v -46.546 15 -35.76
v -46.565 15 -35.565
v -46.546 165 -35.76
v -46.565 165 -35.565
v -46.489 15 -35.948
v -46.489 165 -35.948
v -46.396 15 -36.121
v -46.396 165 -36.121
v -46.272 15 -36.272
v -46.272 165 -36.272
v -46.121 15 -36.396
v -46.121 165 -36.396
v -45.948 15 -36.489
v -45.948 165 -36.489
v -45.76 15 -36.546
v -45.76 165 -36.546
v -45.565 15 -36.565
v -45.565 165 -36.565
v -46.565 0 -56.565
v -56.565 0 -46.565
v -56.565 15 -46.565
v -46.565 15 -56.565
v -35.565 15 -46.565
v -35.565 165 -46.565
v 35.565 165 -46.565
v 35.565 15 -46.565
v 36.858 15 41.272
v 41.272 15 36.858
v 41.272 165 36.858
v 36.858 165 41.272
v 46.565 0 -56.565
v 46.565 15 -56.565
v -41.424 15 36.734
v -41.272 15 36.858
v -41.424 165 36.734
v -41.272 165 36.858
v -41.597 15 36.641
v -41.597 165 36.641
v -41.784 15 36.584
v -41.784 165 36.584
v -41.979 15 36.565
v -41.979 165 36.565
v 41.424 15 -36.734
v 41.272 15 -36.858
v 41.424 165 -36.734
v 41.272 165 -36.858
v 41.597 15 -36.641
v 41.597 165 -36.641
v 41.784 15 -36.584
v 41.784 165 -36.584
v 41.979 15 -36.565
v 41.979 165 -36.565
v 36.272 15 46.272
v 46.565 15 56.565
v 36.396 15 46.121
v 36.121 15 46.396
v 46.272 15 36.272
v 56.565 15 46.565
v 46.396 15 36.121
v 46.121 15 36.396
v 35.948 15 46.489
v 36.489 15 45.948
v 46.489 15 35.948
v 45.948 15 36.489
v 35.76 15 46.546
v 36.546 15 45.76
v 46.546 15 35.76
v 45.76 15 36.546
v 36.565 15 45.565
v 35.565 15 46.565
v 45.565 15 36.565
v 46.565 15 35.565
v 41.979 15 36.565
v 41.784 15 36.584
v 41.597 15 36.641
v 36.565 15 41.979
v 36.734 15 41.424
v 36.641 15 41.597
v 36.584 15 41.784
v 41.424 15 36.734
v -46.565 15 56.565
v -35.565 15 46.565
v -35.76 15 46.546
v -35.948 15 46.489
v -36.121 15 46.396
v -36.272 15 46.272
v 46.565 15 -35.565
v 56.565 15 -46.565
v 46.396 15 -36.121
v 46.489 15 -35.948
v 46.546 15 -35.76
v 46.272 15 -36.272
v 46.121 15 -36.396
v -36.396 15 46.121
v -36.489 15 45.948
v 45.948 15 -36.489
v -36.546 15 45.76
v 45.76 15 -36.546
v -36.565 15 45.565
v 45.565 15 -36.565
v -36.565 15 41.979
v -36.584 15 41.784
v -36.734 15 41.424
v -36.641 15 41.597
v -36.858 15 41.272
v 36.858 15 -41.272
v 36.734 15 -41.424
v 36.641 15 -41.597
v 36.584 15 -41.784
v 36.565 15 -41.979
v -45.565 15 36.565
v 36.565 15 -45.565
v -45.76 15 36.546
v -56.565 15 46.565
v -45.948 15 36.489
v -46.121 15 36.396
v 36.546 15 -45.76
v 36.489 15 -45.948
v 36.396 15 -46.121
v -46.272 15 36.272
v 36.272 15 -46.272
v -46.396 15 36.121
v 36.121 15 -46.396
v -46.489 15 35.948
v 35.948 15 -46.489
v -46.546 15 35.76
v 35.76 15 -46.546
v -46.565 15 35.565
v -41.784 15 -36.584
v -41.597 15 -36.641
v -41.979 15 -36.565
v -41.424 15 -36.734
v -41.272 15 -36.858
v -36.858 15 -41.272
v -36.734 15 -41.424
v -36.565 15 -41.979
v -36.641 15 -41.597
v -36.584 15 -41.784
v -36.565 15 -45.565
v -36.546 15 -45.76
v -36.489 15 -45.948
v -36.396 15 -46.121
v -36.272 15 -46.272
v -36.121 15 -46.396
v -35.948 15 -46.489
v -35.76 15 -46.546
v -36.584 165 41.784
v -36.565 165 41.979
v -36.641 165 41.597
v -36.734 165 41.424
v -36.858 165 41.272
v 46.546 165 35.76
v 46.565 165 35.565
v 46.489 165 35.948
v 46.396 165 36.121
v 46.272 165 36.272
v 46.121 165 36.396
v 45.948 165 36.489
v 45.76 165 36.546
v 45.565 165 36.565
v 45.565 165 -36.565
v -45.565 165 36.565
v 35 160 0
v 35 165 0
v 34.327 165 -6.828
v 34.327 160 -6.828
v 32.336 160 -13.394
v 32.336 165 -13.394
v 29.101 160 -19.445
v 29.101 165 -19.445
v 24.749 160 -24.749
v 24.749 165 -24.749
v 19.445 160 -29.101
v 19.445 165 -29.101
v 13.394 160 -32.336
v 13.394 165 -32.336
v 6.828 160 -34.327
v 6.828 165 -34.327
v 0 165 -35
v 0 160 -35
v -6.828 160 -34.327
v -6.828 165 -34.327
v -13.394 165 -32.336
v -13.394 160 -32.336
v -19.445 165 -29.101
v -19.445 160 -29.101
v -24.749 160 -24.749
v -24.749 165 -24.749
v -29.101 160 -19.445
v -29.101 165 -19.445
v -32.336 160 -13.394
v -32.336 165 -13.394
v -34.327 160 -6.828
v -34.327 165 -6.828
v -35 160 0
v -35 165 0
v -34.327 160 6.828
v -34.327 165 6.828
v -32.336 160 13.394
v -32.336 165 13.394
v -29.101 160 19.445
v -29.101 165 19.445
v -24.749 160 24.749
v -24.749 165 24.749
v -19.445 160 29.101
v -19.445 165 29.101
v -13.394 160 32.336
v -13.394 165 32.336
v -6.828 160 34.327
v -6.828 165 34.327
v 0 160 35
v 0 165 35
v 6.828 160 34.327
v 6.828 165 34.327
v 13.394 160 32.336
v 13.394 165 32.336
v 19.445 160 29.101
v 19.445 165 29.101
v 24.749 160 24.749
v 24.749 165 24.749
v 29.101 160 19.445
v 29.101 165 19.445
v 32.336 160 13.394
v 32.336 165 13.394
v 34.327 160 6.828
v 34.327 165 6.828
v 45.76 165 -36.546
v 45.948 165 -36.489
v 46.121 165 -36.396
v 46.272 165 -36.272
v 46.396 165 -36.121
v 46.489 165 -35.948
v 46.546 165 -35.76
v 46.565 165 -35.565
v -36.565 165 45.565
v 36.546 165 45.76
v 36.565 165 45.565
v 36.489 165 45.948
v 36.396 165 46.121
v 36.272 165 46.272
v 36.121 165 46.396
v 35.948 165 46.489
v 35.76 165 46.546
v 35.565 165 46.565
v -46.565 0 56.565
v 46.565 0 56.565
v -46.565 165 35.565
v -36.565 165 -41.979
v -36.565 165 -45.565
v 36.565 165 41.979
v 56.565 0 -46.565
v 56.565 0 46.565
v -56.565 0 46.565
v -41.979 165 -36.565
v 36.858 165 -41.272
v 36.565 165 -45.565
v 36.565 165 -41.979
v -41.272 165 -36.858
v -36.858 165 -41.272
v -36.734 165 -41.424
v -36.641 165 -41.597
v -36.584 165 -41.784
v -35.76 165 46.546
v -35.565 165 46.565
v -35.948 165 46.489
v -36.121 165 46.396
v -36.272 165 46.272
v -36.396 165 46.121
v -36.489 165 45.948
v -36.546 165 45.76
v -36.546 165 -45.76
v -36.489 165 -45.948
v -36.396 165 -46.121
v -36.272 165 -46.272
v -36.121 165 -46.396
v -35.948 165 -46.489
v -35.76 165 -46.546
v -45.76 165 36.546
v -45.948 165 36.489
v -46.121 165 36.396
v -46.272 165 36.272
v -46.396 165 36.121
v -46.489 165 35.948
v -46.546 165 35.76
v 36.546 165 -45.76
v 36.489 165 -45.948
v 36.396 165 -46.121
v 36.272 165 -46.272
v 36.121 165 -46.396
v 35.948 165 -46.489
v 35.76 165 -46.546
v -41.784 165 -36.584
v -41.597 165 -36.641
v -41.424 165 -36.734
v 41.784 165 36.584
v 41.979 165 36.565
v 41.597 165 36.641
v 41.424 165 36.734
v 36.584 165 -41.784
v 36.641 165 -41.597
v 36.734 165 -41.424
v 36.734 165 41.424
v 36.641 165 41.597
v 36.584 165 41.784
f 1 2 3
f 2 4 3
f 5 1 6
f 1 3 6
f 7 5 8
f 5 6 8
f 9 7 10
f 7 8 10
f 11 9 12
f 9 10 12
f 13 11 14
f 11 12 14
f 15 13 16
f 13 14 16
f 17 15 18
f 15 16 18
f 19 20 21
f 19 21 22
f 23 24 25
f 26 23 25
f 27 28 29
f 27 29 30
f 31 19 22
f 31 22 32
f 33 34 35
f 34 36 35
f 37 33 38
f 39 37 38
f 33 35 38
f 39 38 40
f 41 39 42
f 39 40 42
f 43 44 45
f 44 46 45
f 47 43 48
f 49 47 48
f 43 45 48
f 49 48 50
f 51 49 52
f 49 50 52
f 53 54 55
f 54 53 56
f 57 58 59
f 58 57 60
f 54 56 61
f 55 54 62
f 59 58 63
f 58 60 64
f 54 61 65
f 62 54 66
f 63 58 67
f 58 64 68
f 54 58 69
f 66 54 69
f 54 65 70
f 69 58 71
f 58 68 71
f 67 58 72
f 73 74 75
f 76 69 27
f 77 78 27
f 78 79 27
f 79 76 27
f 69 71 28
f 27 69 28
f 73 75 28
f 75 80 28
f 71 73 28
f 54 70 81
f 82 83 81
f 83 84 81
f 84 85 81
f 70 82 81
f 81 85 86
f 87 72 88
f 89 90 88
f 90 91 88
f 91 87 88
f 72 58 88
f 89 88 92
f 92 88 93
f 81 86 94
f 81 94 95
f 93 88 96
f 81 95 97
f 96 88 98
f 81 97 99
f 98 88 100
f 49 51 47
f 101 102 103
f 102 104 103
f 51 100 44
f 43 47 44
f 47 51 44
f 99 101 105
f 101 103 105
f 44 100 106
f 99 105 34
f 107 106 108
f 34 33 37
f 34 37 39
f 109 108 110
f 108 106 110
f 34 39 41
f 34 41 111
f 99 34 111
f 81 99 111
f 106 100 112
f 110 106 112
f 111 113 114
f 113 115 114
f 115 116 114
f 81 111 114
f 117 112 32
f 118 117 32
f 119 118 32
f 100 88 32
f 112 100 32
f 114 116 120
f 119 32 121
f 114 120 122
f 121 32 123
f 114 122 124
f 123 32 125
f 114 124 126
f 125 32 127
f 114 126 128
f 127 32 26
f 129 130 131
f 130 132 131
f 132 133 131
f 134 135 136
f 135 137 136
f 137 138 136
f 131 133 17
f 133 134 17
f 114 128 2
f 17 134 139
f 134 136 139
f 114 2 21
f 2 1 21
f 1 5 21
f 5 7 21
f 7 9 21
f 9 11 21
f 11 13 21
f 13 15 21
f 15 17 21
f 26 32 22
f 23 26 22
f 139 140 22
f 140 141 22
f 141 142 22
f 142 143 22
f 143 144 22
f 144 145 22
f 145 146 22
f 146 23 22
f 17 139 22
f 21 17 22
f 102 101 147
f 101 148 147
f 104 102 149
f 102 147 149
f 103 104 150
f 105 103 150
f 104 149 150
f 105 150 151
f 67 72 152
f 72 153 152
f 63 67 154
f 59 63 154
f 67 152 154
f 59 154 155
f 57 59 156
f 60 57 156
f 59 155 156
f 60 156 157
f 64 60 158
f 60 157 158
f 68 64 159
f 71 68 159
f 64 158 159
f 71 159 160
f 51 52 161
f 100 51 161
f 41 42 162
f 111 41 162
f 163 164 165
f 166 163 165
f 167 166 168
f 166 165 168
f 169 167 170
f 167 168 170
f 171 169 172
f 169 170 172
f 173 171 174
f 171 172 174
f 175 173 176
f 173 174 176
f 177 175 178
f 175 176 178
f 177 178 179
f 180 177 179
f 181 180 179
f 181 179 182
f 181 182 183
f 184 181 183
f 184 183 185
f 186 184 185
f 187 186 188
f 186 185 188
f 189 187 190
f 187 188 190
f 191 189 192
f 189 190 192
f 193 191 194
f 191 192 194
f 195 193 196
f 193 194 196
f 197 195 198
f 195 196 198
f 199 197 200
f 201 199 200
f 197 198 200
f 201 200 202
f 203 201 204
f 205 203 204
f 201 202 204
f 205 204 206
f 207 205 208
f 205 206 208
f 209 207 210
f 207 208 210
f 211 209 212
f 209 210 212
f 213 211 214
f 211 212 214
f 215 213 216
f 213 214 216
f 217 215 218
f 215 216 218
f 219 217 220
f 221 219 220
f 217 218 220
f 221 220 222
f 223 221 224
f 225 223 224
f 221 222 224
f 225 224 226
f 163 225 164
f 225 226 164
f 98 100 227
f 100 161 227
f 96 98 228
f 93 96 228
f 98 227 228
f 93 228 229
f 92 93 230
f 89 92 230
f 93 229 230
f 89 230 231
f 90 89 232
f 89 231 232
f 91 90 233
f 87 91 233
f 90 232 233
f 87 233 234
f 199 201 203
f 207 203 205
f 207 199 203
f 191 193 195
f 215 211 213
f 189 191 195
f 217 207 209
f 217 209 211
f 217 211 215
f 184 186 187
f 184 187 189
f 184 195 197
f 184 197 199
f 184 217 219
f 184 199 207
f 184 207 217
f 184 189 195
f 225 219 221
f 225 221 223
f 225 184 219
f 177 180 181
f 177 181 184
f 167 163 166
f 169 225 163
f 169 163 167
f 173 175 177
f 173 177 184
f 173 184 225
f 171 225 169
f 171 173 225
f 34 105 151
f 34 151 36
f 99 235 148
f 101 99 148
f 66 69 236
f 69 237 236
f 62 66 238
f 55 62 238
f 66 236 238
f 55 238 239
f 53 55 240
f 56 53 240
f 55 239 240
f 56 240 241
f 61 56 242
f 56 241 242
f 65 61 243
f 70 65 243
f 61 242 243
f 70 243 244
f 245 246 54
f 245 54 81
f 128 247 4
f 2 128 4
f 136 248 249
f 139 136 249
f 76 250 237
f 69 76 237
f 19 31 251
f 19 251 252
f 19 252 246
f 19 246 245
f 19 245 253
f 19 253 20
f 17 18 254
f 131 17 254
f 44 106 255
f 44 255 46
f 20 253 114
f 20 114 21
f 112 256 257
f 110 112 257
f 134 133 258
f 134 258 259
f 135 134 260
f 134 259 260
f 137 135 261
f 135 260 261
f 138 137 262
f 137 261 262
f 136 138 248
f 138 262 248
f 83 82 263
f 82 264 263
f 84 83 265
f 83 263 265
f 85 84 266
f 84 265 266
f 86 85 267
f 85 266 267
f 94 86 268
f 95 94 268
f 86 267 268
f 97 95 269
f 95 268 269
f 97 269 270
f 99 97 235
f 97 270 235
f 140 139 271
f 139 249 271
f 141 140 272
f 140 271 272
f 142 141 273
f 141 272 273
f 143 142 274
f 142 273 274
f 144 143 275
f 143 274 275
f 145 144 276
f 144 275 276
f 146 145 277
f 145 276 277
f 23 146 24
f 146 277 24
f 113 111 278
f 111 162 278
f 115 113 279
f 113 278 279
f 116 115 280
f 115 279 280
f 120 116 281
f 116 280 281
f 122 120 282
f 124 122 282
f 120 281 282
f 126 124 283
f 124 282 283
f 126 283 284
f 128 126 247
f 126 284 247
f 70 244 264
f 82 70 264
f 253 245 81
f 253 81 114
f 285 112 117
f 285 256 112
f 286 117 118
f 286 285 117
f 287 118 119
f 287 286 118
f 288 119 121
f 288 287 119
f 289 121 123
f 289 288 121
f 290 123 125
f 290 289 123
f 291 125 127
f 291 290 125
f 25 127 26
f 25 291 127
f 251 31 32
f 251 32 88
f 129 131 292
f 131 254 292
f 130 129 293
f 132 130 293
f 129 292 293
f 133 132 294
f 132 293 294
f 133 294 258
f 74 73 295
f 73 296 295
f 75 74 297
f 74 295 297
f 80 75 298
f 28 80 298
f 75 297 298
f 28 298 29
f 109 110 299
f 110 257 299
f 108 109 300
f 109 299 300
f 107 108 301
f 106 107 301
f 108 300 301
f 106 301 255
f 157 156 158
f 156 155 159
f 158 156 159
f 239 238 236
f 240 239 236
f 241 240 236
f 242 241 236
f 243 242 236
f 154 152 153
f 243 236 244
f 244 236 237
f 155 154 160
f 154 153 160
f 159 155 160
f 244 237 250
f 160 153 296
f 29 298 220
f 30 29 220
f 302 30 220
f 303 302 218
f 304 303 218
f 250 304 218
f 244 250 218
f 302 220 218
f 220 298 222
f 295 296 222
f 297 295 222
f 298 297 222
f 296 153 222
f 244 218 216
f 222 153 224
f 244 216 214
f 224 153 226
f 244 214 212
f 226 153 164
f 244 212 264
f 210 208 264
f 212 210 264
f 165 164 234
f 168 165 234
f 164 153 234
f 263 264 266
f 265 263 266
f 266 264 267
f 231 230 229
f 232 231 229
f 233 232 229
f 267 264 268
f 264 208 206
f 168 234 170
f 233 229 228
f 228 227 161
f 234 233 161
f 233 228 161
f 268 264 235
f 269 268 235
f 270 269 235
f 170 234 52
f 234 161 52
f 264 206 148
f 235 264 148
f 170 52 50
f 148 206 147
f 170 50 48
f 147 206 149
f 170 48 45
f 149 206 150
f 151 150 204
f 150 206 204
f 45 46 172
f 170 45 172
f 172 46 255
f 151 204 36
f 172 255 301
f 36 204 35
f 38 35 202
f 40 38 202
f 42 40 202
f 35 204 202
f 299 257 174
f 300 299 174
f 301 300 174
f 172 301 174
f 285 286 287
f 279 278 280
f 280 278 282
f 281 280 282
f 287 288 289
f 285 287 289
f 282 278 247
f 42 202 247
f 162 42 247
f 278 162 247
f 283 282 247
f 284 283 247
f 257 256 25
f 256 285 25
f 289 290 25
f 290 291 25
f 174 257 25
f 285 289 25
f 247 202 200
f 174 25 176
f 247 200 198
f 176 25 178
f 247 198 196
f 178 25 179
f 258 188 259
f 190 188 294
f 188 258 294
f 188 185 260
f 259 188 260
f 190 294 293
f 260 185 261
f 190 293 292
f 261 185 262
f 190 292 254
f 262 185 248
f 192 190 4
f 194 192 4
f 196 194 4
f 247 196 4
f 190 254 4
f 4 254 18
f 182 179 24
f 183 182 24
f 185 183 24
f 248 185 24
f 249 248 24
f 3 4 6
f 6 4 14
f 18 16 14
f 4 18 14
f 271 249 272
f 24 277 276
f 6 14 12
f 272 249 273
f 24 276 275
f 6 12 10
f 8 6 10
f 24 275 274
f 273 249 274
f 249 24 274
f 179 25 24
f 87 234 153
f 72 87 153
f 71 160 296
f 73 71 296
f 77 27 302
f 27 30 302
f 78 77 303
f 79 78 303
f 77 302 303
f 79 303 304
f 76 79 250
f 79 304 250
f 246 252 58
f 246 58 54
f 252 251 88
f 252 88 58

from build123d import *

# Parameters (mm, degrees)
BOSS_EXTRUDE1_DEPTH = 15
BOSS_EXTRUDE2_DEPTH = 150
FILLET1_R           = 1
SKETCH3_R           = 35
CUT_EXTRUDE1_DEPTH  = 5


with BuildPart() as part:
    # Sketch1 → Boss-Extrude1 (new body)
    with BuildSketch(Plane(origin=(0, 0, 0), x_dir=(1, 0, 0), z_dir=(0, 1, 0))):
        Polygon((-56.565, 46.565), (-46.565, 56.565), (46.565, 56.565), (56.565, 46.565), (56.565, -46.565), (46.565, -56.565), (-46.565, -56.565), (-56.565, -46.565), align=None)
    extrude(amount=BOSS_EXTRUDE1_DEPTH)

    # Sketch2 → Boss-Extrude2 (add)
    with BuildSketch(Plane(origin=(0, 15, 0), x_dir=(1, 0, 0), z_dir=(0, 1, 0))):
        Polygon((36.565, 46.565), (36.565, 41.565), (41.565, 36.565), (46.565, 36.565), (46.565, -36.565), (41.565, -36.565), (36.565, -41.565), (36.565, -46.565), (-36.565, -46.565), (-36.565, -41.565), (-41.565, -36.565), (-46.565, -36.565), (-46.565, 36.565), (-41.565, 36.565), (-36.565, 41.565), (-36.565, 46.565), align=None)
    extrude(amount=BOSS_EXTRUDE2_DEPTH)

    # Fillet1
    fillet1_edges = [part.edges().sort_by_distance(p)[0] for p in [
        (36.565, 90, -46.565),
        (-36.565, 90, -46.565),
        (-36.565, 90, -41.565),
        (-41.565, 90, -36.565),
        (-46.565, 90, -36.565),
        (-46.565, 90, 36.565),
        (-41.565, 90, 36.565),
        (-36.565, 90, 41.565),
        (-36.565, 90, 46.565),
        (36.565, 90, 46.565),
        (36.565, 90, 41.565),
        (41.565, 90, 36.565),
        (46.565, 90, 36.565),
        (46.565, 90, -36.565),
        (41.565, 90, -36.565),
        (36.565, 90, -41.565),
    ]]
    fillet(fillet1_edges, radius=FILLET1_R)

    # Sketch3 → Cut-Extrude1 (cut)
    with BuildSketch(Plane(origin=(0, 165, 0), x_dir=(1, 0, 0), z_dir=(0, 1, 0))):
        Circle(SKETCH3_R)
    extrude(amount=-CUT_EXTRUDE1_DEPTH, mode=Mode.SUBTRACT)


solid = part.part
